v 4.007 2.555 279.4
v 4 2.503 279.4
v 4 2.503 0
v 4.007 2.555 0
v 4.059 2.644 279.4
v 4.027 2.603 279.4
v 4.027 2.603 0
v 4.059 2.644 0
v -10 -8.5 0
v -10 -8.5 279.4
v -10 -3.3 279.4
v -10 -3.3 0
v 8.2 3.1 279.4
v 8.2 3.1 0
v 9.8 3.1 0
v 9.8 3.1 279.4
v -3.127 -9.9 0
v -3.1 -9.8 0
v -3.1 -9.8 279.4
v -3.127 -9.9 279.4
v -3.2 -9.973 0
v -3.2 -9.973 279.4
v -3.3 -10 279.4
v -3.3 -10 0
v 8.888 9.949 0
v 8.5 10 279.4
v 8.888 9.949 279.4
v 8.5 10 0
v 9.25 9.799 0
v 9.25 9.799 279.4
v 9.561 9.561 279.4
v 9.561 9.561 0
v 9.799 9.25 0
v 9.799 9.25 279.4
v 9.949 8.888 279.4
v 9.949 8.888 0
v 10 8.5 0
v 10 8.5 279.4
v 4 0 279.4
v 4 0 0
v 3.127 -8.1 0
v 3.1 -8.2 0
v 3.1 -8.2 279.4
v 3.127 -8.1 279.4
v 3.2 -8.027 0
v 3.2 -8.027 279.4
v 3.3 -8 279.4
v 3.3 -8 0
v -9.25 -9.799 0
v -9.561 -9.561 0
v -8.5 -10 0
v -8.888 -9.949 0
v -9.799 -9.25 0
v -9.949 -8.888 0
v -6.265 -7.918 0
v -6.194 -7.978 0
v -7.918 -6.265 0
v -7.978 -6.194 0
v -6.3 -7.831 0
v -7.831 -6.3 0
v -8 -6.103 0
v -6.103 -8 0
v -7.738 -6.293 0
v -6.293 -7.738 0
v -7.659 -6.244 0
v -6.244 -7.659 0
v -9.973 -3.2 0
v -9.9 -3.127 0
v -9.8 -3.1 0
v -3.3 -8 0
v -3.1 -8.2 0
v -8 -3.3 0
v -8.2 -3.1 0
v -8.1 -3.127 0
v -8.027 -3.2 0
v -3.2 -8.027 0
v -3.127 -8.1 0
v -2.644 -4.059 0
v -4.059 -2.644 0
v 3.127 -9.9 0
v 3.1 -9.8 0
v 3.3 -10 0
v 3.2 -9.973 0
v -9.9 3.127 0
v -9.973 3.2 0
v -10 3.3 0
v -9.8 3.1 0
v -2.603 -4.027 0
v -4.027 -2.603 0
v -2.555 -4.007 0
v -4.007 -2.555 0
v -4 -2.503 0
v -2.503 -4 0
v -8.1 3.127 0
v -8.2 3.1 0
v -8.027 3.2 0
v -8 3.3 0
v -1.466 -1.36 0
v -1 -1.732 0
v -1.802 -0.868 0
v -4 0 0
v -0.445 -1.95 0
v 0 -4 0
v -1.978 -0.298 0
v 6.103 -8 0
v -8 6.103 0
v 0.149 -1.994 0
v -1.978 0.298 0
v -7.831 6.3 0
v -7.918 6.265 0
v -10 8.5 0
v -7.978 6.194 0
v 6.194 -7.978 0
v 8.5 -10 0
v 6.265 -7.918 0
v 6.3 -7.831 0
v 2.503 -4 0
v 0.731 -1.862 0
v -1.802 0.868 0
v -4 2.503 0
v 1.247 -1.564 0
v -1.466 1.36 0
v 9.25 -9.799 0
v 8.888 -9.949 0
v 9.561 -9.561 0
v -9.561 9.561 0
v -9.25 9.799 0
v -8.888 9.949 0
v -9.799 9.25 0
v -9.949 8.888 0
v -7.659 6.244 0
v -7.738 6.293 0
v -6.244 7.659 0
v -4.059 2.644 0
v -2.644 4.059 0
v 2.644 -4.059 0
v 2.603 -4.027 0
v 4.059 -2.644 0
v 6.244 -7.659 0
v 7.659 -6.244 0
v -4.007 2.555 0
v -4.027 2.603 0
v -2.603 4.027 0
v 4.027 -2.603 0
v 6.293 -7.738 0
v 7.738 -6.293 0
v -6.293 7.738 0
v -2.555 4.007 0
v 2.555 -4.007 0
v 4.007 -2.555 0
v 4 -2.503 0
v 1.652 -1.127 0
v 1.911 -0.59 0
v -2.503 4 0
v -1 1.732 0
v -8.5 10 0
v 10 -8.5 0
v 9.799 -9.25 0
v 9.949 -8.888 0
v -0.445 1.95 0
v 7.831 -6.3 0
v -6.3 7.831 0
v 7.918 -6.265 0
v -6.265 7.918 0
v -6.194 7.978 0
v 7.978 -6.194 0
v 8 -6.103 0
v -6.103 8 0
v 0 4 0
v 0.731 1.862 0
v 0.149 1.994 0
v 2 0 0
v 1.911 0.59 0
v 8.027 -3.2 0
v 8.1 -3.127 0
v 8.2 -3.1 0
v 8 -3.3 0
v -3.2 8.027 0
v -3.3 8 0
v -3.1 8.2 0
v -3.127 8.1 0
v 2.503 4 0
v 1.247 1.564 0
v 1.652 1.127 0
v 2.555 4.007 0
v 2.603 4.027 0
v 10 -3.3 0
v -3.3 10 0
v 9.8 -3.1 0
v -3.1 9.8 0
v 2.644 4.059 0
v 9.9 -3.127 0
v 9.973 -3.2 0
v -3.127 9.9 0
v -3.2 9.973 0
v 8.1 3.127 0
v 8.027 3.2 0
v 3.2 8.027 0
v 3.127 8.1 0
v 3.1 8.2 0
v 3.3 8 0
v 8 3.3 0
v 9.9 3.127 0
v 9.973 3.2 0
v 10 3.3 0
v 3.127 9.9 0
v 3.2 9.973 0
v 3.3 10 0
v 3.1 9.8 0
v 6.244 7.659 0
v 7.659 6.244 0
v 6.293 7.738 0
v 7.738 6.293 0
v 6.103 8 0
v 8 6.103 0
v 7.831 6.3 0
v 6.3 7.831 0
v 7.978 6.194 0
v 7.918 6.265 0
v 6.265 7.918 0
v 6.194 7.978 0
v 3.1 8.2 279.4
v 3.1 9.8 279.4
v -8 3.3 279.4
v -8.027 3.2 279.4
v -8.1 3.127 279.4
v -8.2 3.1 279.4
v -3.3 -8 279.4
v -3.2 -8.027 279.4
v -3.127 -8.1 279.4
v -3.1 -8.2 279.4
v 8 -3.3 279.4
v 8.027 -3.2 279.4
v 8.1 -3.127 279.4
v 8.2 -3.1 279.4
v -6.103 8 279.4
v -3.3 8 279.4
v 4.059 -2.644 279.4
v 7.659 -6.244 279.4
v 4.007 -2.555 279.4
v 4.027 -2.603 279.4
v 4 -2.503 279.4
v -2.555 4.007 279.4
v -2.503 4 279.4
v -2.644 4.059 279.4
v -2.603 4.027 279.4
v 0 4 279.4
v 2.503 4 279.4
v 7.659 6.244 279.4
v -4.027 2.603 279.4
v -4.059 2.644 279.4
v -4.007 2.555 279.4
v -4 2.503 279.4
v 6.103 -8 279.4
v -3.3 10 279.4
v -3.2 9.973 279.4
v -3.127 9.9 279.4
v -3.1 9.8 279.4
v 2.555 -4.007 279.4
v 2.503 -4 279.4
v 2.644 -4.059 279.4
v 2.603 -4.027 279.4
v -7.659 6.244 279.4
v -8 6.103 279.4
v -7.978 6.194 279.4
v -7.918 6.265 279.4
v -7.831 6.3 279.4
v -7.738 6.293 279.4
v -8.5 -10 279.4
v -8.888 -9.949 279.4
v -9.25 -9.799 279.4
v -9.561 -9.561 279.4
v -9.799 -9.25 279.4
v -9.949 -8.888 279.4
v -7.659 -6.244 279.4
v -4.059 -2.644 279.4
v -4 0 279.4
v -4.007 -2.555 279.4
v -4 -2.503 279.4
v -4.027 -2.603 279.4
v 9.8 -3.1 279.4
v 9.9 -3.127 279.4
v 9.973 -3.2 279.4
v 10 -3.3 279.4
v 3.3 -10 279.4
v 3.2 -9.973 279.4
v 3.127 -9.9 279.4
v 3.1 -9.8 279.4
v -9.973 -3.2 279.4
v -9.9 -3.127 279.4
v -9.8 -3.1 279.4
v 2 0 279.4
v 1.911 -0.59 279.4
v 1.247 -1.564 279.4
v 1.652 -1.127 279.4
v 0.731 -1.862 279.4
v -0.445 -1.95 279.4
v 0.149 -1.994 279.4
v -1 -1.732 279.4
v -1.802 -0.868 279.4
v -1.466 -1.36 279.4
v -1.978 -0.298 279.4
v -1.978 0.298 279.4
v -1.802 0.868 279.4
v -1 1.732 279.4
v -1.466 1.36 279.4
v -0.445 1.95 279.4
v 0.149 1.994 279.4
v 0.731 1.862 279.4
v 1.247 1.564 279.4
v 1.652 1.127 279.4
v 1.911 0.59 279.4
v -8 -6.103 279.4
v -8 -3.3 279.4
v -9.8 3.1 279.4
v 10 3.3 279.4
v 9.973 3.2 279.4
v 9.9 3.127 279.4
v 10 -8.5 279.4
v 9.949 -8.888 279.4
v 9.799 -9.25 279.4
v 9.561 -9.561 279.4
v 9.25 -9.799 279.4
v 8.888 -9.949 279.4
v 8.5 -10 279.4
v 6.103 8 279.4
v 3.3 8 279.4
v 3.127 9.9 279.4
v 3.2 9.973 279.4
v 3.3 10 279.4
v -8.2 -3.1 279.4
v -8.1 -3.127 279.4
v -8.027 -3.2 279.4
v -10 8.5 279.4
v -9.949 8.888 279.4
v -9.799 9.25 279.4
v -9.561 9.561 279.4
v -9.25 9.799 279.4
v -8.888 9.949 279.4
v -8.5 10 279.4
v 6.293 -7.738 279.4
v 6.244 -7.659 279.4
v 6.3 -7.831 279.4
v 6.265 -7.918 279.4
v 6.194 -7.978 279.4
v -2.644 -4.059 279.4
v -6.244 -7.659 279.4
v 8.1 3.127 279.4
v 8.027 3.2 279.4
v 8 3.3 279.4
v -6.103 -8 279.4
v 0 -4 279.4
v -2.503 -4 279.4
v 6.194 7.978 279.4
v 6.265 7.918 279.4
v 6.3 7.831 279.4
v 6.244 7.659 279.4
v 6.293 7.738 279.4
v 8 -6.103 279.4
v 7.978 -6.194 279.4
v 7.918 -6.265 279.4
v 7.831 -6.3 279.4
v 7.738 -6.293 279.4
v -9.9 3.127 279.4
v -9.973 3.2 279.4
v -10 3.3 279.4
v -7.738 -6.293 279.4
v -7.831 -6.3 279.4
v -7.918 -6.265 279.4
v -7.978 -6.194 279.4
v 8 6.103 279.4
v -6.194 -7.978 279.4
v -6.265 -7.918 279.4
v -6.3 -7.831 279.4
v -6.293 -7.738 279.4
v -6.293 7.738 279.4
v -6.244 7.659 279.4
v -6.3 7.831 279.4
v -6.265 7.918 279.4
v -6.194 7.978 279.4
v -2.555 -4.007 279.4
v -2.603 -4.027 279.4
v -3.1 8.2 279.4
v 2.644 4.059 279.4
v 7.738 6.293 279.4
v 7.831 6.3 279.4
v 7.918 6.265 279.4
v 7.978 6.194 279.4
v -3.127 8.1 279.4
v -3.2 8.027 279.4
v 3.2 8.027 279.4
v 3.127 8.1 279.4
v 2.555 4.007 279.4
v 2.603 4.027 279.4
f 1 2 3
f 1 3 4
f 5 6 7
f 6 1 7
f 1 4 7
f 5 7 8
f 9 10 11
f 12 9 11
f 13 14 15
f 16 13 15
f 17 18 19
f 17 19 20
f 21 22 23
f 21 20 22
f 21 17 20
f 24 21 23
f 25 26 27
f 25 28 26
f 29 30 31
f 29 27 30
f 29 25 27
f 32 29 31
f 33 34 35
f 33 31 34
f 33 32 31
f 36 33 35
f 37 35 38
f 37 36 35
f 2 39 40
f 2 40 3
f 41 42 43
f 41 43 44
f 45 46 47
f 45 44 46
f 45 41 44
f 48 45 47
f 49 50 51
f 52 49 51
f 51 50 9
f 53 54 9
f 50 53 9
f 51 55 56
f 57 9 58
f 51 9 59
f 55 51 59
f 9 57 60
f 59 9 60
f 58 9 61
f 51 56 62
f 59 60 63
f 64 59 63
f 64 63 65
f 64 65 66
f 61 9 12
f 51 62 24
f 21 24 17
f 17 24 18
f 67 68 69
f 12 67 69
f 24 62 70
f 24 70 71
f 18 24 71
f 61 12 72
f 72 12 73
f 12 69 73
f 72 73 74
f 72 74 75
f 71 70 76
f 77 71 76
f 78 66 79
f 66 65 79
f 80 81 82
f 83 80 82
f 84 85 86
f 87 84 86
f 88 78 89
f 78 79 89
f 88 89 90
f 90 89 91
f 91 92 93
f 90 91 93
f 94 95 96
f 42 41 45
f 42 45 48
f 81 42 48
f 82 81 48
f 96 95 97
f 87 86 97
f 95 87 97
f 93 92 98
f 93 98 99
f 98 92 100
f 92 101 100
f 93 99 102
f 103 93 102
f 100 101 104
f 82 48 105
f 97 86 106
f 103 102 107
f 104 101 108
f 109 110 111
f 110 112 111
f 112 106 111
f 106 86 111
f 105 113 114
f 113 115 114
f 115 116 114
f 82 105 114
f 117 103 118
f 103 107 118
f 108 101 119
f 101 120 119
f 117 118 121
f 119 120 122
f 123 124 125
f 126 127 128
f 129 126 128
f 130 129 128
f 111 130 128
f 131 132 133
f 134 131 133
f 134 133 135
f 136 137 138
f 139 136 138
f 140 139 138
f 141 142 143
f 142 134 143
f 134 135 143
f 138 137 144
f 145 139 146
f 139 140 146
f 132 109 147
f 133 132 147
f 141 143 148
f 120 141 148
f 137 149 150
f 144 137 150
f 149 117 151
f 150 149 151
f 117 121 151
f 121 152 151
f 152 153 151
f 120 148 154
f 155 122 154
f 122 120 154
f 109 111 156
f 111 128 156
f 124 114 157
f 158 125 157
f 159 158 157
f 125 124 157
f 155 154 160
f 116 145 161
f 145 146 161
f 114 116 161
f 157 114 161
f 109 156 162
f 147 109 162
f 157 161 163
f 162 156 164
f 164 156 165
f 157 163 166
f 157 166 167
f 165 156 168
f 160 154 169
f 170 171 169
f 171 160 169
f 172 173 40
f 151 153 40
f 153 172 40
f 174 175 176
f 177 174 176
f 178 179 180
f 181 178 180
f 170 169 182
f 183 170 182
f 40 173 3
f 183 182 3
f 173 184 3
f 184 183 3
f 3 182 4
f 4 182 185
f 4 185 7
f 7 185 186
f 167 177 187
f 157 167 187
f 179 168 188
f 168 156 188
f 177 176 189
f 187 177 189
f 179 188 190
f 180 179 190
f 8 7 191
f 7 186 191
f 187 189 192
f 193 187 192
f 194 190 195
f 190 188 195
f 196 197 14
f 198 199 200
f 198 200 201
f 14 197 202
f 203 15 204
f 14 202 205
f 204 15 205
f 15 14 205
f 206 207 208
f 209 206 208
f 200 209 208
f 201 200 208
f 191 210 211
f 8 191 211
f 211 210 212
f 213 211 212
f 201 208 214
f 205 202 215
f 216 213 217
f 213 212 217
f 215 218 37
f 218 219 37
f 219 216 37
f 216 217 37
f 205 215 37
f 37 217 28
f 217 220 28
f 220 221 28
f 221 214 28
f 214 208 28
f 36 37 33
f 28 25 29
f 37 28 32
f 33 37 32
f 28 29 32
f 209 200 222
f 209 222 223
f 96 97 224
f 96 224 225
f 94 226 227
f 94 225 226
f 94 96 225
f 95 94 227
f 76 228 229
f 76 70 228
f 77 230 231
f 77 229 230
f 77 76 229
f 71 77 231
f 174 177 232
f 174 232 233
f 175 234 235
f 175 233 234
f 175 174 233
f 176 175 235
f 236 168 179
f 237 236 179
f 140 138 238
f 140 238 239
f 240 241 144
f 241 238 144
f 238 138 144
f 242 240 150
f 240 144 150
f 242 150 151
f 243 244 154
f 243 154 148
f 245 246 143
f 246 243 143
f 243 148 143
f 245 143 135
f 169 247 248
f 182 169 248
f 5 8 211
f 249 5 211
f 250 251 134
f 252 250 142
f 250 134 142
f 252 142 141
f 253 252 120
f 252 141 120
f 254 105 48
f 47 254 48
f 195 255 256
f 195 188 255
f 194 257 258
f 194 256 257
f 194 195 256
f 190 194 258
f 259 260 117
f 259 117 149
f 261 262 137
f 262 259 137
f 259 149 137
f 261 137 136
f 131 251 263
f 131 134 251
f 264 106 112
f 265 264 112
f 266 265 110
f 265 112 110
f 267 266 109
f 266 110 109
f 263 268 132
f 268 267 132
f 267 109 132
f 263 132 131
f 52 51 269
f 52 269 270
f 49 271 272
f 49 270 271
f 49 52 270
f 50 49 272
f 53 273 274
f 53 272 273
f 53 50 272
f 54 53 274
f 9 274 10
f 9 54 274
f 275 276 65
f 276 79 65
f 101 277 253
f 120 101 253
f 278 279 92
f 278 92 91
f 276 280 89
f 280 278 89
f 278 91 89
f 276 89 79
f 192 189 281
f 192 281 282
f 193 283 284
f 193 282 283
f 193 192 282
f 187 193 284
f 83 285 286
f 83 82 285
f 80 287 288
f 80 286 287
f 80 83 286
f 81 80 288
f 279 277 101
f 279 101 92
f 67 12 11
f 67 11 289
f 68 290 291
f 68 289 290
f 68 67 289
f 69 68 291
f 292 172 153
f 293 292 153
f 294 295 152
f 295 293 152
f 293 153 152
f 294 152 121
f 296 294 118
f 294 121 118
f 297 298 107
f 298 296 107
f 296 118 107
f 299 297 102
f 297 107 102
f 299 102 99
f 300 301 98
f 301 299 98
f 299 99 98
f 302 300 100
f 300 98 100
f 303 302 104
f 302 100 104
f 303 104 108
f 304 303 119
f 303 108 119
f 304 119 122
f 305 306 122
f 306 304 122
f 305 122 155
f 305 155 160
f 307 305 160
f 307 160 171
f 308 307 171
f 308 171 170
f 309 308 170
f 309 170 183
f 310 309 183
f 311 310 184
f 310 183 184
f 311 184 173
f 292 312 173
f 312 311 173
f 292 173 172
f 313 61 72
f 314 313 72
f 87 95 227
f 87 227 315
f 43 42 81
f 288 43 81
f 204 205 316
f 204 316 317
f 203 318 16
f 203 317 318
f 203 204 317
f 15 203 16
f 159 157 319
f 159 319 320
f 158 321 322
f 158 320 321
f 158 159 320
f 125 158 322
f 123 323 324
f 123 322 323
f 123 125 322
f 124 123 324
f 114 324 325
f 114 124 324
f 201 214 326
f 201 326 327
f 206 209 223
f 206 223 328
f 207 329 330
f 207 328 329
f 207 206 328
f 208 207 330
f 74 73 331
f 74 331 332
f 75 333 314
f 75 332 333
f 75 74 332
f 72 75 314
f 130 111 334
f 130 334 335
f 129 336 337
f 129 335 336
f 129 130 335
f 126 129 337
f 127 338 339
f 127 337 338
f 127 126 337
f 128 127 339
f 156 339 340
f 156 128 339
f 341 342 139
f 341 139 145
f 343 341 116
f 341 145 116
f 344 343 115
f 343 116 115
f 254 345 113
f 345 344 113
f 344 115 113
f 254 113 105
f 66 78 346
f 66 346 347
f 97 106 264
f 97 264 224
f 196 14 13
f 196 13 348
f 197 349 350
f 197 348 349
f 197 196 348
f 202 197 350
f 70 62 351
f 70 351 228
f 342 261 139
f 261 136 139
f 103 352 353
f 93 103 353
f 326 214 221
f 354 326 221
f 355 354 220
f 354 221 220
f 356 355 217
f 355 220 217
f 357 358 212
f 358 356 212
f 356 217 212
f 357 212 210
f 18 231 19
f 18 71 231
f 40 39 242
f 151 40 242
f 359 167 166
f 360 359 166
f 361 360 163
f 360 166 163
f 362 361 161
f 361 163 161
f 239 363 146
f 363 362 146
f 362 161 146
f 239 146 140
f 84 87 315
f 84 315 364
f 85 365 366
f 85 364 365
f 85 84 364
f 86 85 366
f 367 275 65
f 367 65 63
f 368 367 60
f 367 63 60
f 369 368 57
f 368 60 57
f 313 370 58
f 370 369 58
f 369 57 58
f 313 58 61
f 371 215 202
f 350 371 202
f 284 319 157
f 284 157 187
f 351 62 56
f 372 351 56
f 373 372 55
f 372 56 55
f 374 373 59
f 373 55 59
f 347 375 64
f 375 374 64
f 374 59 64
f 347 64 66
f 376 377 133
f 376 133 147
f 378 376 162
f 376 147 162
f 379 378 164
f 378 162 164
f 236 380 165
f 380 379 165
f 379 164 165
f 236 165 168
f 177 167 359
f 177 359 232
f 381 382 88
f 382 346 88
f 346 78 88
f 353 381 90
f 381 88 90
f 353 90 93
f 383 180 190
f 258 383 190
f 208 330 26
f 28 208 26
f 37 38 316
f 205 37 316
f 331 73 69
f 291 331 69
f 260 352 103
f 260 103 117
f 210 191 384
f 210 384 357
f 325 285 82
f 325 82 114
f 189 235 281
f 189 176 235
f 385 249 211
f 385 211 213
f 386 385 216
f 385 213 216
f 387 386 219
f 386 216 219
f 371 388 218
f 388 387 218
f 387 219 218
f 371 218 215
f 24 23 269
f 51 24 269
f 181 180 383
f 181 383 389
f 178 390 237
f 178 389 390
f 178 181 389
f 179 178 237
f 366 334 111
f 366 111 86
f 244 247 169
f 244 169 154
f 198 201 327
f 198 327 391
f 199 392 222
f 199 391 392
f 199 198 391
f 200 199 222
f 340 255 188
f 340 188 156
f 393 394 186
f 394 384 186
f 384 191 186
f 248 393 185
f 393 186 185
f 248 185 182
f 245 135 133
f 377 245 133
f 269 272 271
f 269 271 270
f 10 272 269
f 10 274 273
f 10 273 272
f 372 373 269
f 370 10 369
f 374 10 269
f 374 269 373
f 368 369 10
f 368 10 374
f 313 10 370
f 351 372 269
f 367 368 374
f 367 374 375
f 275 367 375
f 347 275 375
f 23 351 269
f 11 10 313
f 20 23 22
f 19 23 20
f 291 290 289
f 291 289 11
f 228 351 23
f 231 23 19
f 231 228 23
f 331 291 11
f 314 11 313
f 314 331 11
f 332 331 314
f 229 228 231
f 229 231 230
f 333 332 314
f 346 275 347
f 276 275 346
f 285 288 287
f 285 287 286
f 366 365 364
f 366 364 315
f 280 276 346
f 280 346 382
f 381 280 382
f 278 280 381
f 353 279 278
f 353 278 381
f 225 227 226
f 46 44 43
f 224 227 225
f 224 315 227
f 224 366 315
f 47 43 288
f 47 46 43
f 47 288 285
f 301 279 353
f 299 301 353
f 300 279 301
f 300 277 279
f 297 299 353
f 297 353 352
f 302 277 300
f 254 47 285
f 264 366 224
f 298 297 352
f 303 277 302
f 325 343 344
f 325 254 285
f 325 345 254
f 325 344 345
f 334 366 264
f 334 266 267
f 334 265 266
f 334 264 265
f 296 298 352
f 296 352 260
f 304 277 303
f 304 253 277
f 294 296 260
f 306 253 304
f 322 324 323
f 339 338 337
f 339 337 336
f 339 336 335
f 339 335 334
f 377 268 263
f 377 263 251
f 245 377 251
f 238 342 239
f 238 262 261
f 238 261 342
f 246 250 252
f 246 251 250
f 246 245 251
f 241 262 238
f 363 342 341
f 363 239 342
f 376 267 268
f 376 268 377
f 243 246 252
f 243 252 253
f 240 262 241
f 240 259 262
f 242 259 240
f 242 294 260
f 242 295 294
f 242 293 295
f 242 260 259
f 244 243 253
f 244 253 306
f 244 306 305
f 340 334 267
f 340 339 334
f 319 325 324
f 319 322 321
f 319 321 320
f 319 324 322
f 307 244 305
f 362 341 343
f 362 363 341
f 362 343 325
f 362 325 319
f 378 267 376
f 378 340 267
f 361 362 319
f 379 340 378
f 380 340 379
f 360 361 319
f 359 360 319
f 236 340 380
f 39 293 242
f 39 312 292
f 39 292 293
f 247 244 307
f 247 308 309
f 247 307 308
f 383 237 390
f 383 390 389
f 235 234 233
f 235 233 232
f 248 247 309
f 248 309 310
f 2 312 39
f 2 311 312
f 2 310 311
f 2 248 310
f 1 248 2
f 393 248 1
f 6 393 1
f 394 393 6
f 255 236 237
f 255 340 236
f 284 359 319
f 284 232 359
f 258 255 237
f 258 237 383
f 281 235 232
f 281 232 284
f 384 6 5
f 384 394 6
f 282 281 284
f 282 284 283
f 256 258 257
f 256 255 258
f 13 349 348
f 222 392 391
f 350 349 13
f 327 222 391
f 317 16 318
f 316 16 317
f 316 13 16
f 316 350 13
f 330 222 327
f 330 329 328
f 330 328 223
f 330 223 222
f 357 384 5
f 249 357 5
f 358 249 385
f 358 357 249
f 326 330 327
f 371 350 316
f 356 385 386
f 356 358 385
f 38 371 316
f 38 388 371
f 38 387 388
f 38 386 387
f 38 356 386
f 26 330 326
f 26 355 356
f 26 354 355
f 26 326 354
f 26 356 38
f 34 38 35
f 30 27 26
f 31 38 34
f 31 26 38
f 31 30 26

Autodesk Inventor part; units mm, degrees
ref_plane "YZ Plane" through (0, 0, 0) normal (1, 0, 0) x (0, 1, 0)
ref_plane "XZ Plane" through (0, 0, 0) normal (0, 1, 0) x (-1, 0, 0)
ref_plane "XY Plane" through (0, 0, 0) normal (0, 0, 1) x (1, 0, 0)
sketch "Sketch1" plane through (0, 0, 0) normal (0, 0, 1) x (1, 0, 0)
  line L0 (-10, 10) -> (10, 10) construction
  line L1 (10, 10) -> (10, -10) construction
  line L2 (10, -10) -> (-10, -10) construction
  line L3 (-10, -10) -> (-10, 10) construction
  line L4 (-10, 10) -> (10, -10) construction
  line L5 (10, 10) -> (-10, -10) construction
  circle A0 centre (0, 0) radius 2
  line L6 (-4, -4) -> (4, -4) construction
  line L7 (4, -4) -> (4, 4) construction
  line L8 (4, 4) -> (-4, 4) construction
  line L9 (-4, 4) -> (-4, -4) construction
  line L10 (-4, -4) -> (4, 4) construction
  line L11 (4, -4) -> (-4, 4) construction
  line L12 (2.6444, 4.0586) -> (6.2444, 7.6586)
  line L13 (6.1029, 8) -> (3.3, 8)
  line L14 (3.1, 8.2) -> (3.1, 9.8)
  line L15 (3.3, 10) -> (8.5, 10)
  line L16 (4.0586, 2.6444) -> (7.6586, 6.2444)
  line L17 (8, 6.1029) -> (8, 3.3)
  line L18 (8.2, 3.1) -> (9.8, 3.1)
  line L19 (10, 8.5) -> (10, 3.3)
  line L20 (0, 4) -> (2.5029, 4)
  line L21 (4, 0) -> (4, 2.5029)
  line L22 (0, 10) -> (0, -10) construction
  line L23 (-10, 0) -> (10, 0) construction
  line L24 (-2.6444, 4.0586) -> (-6.2444, 7.6586)
  line L25 (-6.1029, 8) -> (-3.3, 8)
  line L26 (-3.1, 8.2) -> (-3.1, 9.8)
  line L27 (-3.3, 10) -> (-8.5, 10)
  line L28 (-4.0586, 2.6444) -> (-7.6586, 6.2444)
  line L29 (-8, 6.1029) -> (-8, 3.3)
  line L30 (-8.2, 3.1) -> (-9.8, 3.1)
  line L31 (-10, 8.5) -> (-10, 3.3)
  line L32 (0, 4) -> (-2.5029, 4)
  line L33 (-4, 0) -> (-4, 2.5029)
  line L34 (2.6444, -4.0586) -> (6.2444, -7.6586)
  line L35 (6.1029, -8) -> (3.3, -8)
  line L36 (3.1, -8.2) -> (3.1, -9.8)
  line L37 (3.3, -10) -> (8.5, -10)
  line L38 (4.0586, -2.6444) -> (7.6586, -6.2444)
  line L39 (8, -6.1029) -> (8, -3.3)
  line L40 (8.2, -3.1) -> (9.8, -3.1)
  line L41 (10, -8.5) -> (10, -3.3)
  line L42 (0, -4) -> (2.5029, -4)
  line L43 (4, 0) -> (4, -2.5029)
  line L44 (0, -4) -> (-2.5029, -4)
  line L45 (-2.6444, -4.0586) -> (-6.2444, -7.6586)
  line L46 (-6.1029, -8) -> (-3.3, -8)
  line L47 (-3.1, -8.2) -> (-3.1, -9.8)
  line L48 (-3.3, -10) -> (-8.5, -10)
  line L49 (-4.0586, -2.6444) -> (-7.6586, -6.2444)
  line L50 (-4, 0) -> (-4, -2.5029)
  line L51 (-8, -6.1029) -> (-8, -3.3)
  line L52 (-8.2, -3.1) -> (-9.8, -3.1)
  line L53 (-10, -8.5) -> (-10, -3.3)
  arc A1 (10, 8.5) -> (8.5, 10) centre (8.5, 8.5) ccw
  arc A2 (-8.5, 10) -> (-10, 8.5) centre (-8.5, 8.5) ccw
  arc A3 (-10, -8.5) -> (-8.5, -10) centre (-8.5, -8.5) ccw
  arc A4 (8.5, -10) -> (10, -8.5) centre (8.5, -8.5) ccw
  arc A5 (-3.1, 9.8) -> (-3.3, 10) centre (-3.3, 9.8) ccw
  arc A6 (-3.3, 8) -> (-3.1, 8.2) centre (-3.3, 8.2) ccw
  arc A7 (-6.1029, 8) -> (-6.2444, 7.6586) centre (-6.1029, 7.8) ccw
  arc A8 (6.2444, 7.6586) -> (6.1029, 8) centre (6.1029, 7.8) ccw
  arc A9 (-8, -6.1029) -> (-7.6586, -6.2444) centre (-7.8, -6.1029) ccw
  arc A10 (-3.1, -8.2) -> (-3.3, -8) centre (-3.3, -8.2) ccw
  arc A11 (6.1029, -8) -> (6.2444, -7.6586) centre (6.1029, -7.8) ccw
  arc A12 (3.3, -8) -> (3.1, -8.2) centre (3.3, -8.2) ccw
  arc A13 (-6.2444, -7.6586) -> (-6.1029, -8) centre (-6.1029, -7.8) ccw
  arc A14 (7.6586, -6.2444) -> (8, -6.1029) centre (7.8, -6.1029) ccw
  arc A15 (8.2, -3.1) -> (8, -3.3) centre (8.2, -3.3) ccw
  arc A16 (8, 6.1029) -> (7.6586, 6.2444) centre (7.8, 6.1029) ccw
  arc A17 (8, 3.3) -> (8.2, 3.1) centre (8.2, 3.3) ccw
  arc A18 (3.3, 10) -> (3.1, 9.8) centre (3.3, 9.8) ccw
  arc A19 (-2.6444, 4.0586) -> (-2.5029, 4) centre (-2.5029, 4.2) ccw
  arc A20 (2.5029, 4) -> (2.6444, 4.0586) centre (2.5029, 4.2) ccw
  arc A21 (4.0586, 2.6444) -> (4, 2.5029) centre (4.2, 2.5029) ccw
  arc A22 (4, -2.5029) -> (4.0586, -2.6444) centre (4.2, -2.5029) ccw
  arc A23 (2.6444, -4.0586) -> (2.5029, -4) centre (2.5029, -4.2) ccw
  arc A24 (-2.5029, -4) -> (-2.6444, -4.0586) centre (-2.5029, -4.2) ccw
  arc A25 (-4.0586, -2.6444) -> (-4, -2.5029) centre (-4.2, -2.5029) ccw
  arc A26 (-4, 2.5029) -> (-4.0586, 2.6444) centre (-4.2, 2.5029) ccw
  arc A27 (-7.6586, 6.2444) -> (-8, 6.1029) centre (-7.8, 6.1029) ccw
  arc A28 (-8.2, 3.1) -> (-8, 3.3) centre (-8.2, 3.3) ccw
  arc A29 (-10, 3.3) -> (-9.8, 3.1) centre (-9.8, 3.3) ccw
  arc A30 (-8, -3.3) -> (-8.2, -3.1) centre (-8.2, -3.3) ccw
  arc A31 (-9.8, -3.1) -> (-10, -3.3) centre (-9.8, -3.3) ccw
  arc A32 (-3.3, -10) -> (-3.1, -9.8) centre (-3.3, -9.8) ccw
  arc A33 (3.1, -9.8) -> (3.3, -10) centre (3.3, -9.8) ccw
  arc A34 (10, -3.3) -> (9.8, -3.1) centre (9.8, -3.3) ccw
  arc A35 (9.8, 3.1) -> (10, 3.3) centre (9.8, 3.3) ccw
  arc A36 (3.1, 8.2) -> (3.3, 8) centre (3.3, 8.2) ccw
  point P0 (2.5858, 4)
  point P1 (6.5858, 8)
  point P2 (3.1, 8)
  point P3 (3.1, 10)
  point P4 (4, 2.5858)
  point P5 (8, 6.5858)
  point P6 (8, 3.1)
  point P7 (10, 3.1)
  point P8 (-2.5858, 4)
  point P9 (-6.5858, 8)
  point P10 (-3.1, 8)
  point P11 (-3.1, 10)
  point P12 (-4, 2.5858)
  point P13 (-8, 6.5858)
  point P14 (-8, 3.1)
  point P15 (-10, 3.1)
  point P16 (2.5858, -4)
  point P17 (6.5858, -8)
  point P18 (3.1, -8)
  point P19 (3.1, -10)
  point P20 (4, -2.5858)
  point P21 (8, -6.5858)
  point P22 (8, -3.1)
  point P23 (10, -3.1)
  point P24 (-2.5858, -4)
  point P25 (-6.5858, -8)
  point P26 (-3.1, -8)
  point P27 (-3.1, -10)
  point P28 (-4, -2.5858)
  point P29 (-8, -6.5858)
  point P30 (-8, -3.1)
  point P31 (-10, -3.1)
  dimension "d0" = 20
  dimension "d1" = 20
  dimension "d2" = 4
  dimension "d5" = 6
  dimension "t" = 2
  dimension "d7" = 1
  dimension "d8" = 2
  dimension "d9" = 2
  dimension "d10" = 3.1
  dimension "d11" = 3.1
  dimension "d15" = 1.5
  dimension "d16" = 1.5
  dimension "d17" = 1.5
  dimension "d18" = 1.5
  dimension "d19" = 0.2
  dimension "d20" = 0.2
  dimension "d21" = 0.2
  dimension "d22" = 0.2
  dimension "d23" = 0.2
  dimension "d24" = 0.2
  dimension "d25" = 0.2
  dimension "d26" = 0.2
  dimension "d27" = 0.2
  dimension "d28" = 0.2
  dimension "d29" = 0.2
  dimension "d30" = 0.2
  dimension "d31" = 0.2
  dimension "d32" = 0.2
  dimension "d33" = 0.2
  dimension "d34" = 0.2
  dimension "d35" = 0.2
  dimension "d36" = 0.2
  dimension "d37" = 0.2
  dimension "d38" = 0.2
  dimension "d39" = 0.2
  dimension "d40" = 0.2
  dimension "d41" = 0.2
extrude "2020 Al T-S (1000mm)" add sketch "Sketch1" along normal blind 279.4
equation "\"d1\" = d0"
equation "\"d7\" = 0.5 * t"
equation "\"d8\" = t"
equation "\"d9\" = t"
equation "\"d11\" = d10"
properties part number "2020 Aluminium Extrusion T-Slot lower arm" material "Aluminum 6061"
